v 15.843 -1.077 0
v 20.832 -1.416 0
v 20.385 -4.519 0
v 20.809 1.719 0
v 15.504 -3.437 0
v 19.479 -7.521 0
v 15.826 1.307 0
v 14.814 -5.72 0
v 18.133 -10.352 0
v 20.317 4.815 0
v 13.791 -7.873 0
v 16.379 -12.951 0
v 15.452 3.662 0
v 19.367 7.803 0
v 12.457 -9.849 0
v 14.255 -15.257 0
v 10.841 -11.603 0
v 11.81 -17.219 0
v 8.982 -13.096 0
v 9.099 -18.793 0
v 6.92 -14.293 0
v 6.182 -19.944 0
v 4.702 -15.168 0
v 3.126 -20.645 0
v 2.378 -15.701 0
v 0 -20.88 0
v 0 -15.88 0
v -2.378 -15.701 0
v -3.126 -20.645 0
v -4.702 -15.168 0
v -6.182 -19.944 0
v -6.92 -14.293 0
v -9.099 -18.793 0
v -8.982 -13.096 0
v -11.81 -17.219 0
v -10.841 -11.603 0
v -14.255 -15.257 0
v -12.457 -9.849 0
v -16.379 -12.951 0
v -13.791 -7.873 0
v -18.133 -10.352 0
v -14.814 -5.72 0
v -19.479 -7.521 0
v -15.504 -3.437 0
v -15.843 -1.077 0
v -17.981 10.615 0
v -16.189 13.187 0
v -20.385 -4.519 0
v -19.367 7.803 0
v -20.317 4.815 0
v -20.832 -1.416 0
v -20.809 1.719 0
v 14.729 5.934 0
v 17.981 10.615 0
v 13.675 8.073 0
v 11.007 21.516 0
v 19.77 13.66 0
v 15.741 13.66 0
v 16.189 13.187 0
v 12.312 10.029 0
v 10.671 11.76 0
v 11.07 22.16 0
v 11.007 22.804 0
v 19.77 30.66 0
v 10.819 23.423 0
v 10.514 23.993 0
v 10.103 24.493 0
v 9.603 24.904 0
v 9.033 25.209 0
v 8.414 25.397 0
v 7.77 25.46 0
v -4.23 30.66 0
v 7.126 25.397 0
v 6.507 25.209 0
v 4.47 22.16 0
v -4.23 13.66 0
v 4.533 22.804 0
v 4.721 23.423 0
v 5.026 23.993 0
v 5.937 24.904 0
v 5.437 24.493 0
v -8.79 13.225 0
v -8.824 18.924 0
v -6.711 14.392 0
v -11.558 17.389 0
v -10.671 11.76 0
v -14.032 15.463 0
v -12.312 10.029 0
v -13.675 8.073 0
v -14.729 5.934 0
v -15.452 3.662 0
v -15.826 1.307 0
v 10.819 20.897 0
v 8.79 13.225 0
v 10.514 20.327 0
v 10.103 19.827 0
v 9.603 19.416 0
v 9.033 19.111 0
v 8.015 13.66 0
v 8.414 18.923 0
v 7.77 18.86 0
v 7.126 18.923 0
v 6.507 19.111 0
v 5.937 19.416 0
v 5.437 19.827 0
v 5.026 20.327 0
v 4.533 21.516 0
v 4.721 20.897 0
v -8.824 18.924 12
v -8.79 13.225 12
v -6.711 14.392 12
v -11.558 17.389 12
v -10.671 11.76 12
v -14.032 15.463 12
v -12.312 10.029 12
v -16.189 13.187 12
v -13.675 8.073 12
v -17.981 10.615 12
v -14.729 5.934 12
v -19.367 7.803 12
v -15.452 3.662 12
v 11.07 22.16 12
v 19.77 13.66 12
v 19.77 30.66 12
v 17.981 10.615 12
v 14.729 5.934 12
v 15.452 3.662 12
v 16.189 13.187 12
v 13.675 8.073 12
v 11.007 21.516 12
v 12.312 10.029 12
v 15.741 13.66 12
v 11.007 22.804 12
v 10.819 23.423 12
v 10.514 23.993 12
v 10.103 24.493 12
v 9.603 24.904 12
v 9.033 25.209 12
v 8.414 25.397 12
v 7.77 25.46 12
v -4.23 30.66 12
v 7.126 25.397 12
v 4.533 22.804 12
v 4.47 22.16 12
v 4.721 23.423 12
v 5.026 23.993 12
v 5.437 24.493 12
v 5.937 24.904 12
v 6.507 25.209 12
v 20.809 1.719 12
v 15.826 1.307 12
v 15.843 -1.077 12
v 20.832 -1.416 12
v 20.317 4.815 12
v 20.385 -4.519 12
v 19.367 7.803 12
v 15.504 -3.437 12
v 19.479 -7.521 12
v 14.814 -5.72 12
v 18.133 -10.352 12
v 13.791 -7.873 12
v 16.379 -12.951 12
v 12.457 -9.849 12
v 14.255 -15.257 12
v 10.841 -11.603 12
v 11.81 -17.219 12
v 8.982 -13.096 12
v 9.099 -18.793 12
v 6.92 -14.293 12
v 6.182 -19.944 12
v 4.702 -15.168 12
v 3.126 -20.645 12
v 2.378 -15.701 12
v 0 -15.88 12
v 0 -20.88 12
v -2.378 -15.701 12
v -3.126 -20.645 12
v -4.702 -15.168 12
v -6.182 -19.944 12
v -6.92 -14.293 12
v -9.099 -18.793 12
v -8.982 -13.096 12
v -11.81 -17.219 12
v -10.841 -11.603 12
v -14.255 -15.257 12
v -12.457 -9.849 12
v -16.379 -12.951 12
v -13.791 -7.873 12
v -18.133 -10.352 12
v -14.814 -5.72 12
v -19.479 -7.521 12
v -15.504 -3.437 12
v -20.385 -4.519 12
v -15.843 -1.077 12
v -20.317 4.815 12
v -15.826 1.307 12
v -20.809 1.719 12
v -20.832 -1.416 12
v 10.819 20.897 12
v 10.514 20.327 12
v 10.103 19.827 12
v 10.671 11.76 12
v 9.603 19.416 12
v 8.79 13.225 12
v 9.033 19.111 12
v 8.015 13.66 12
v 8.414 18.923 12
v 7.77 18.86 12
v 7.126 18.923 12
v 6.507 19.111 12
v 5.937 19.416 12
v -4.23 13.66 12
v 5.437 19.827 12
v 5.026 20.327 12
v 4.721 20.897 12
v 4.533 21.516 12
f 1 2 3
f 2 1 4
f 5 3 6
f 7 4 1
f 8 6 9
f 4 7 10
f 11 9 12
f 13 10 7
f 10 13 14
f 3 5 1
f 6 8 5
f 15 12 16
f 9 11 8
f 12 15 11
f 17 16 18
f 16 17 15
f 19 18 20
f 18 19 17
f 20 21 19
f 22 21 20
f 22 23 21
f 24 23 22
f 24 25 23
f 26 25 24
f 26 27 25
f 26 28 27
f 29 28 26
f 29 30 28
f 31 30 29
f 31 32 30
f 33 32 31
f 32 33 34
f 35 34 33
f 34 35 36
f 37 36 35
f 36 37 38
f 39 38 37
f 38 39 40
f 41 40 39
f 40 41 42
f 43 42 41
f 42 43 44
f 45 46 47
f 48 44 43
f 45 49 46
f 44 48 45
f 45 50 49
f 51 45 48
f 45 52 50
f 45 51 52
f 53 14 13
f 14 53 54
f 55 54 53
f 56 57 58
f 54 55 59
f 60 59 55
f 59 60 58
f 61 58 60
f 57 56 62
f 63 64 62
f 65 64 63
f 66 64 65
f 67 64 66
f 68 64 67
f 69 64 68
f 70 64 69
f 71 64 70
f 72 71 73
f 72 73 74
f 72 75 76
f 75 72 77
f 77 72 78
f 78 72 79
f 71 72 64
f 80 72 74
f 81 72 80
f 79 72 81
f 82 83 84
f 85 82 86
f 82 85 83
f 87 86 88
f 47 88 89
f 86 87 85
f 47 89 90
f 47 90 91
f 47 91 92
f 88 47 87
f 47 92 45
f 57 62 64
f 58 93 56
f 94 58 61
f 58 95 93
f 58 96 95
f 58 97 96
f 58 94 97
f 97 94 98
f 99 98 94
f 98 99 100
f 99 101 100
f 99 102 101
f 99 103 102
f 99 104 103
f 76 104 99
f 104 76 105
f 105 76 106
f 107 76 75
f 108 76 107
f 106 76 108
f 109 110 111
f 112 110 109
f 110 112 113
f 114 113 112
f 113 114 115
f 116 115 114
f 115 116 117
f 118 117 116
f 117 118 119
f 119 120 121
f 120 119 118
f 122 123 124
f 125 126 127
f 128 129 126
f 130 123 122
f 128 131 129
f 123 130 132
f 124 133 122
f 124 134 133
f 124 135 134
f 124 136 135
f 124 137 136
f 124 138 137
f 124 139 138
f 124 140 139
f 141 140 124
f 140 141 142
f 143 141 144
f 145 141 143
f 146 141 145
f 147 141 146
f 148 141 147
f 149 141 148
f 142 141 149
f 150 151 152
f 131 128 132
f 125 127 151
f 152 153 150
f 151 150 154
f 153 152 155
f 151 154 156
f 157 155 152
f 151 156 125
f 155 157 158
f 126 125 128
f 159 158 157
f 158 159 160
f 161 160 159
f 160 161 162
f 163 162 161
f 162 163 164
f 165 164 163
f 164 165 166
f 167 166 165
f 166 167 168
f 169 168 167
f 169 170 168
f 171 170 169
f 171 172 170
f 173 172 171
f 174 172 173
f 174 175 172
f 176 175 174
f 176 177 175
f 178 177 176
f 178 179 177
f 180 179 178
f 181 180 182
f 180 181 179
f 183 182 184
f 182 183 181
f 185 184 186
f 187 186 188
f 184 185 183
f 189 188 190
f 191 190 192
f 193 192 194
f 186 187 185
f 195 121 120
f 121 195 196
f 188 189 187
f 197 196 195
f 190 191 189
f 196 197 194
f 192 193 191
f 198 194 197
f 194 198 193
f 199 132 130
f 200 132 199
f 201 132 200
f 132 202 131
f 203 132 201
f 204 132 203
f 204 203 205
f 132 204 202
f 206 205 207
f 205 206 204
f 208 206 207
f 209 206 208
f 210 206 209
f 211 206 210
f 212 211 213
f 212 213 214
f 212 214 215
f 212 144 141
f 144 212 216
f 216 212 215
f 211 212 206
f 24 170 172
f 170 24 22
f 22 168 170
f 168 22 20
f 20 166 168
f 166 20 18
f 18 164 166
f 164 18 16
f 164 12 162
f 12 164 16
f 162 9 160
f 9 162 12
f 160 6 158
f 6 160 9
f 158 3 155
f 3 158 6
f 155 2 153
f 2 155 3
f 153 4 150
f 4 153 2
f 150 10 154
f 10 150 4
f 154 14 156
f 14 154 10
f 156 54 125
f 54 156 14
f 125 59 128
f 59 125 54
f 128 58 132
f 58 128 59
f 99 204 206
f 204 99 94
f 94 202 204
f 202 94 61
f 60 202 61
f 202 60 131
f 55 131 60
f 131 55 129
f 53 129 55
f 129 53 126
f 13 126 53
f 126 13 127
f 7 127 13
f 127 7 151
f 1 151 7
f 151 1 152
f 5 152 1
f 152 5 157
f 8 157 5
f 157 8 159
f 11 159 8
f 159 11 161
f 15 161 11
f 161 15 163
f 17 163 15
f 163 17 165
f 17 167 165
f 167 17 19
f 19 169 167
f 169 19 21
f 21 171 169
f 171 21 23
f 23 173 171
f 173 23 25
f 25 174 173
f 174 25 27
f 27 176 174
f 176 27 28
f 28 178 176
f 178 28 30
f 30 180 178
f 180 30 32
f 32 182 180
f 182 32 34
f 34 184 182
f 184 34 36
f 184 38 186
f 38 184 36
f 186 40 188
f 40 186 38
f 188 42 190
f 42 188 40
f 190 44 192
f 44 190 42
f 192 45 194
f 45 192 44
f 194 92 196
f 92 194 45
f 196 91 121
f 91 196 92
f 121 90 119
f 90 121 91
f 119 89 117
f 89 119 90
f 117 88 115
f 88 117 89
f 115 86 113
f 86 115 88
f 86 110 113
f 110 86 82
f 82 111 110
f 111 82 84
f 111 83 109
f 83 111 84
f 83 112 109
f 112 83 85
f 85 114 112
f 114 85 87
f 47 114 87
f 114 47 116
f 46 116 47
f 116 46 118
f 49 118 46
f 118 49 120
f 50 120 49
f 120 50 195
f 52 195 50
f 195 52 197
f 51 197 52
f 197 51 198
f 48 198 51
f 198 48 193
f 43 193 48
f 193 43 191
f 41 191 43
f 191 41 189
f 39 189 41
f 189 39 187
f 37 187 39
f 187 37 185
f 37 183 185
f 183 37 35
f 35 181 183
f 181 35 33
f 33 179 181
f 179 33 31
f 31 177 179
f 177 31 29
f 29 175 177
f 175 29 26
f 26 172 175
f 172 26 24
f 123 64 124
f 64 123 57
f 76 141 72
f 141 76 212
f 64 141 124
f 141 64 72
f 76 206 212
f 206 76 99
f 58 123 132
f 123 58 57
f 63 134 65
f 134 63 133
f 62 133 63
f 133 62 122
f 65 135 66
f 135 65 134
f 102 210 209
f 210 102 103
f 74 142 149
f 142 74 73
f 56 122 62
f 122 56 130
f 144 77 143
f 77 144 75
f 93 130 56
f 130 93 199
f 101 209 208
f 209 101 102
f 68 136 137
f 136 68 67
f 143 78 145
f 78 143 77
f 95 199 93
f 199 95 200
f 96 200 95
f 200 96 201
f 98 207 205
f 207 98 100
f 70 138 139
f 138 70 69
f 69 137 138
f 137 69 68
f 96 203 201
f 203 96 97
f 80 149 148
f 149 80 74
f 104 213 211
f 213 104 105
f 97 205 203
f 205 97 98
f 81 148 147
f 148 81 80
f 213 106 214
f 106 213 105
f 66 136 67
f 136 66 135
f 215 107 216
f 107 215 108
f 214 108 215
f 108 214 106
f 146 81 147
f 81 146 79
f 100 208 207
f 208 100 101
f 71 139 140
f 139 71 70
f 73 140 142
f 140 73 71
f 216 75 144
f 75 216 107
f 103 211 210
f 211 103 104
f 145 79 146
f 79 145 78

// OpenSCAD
$fn = 32;

// ----------------------------------------------------------------------
// Pipe clamp: 41.76 mm ring, 5 mm wall, 12 mm wide
// ----------------------------------------------------------------------

// --- parameters (mm) ---
outer_r = 20.88;          // clamp outside radius
inner_r = 15.88;          // pipe bore radius
band = 5;                 // band thickness
clamp_w = 12;             // clamp width
opening = 50;             // opening angle between the ends
lug_w = 24;               // lug width
lug_len = 17;             // lug length
bolt_d = 6.6;             // bolt hole

clamp_profile = [[-8.824, 18.924], [-11.558, 17.389], [-14.032, 15.463], [-16.189, 13.187], [-17.981, 10.615], [-19.367, 7.803], [-20.317, 4.815], [-20.809, 1.719], [-20.832, -1.416], [-20.385, -4.519], [-19.479, -7.521], [-18.133, -10.352], [-16.379, -12.951], [-14.255, -15.257], [-11.81, -17.219], [-9.099, -18.793], [-6.182, -19.944], [-3.126, -20.645], [0, -20.88], [3.126, -20.645], [6.182, -19.944], [9.099, -18.793], [11.81, -17.219], [14.255, -15.257], [16.379, -12.951], [18.133, -10.352], [19.479, -7.521], [20.385, -4.519], [20.832, -1.416], [20.809, 1.719], [20.317, 4.815], [19.367, 7.803], [17.981, 10.615], [16.189, 13.187], [14.032, 15.463], [11.558, 17.389], [8.824, 18.924], [6.711, 14.392], [8.79, 13.225], [10.671, 11.76], [12.312, 10.029], [13.675, 8.073], [14.729, 5.934], [15.452, 3.662], [15.826, 1.307], [15.843, -1.077], [15.504, -3.437], [14.814, -5.72], [13.791, -7.873], [12.457, -9.849], [10.841, -11.603], [8.982, -13.096], [6.92, -14.293], [4.702, -15.168], [2.378, -15.701], [0, -15.88], [-2.378, -15.701], [-4.702, -15.168], [-6.92, -14.293], [-8.982, -13.096], [-10.841, -11.603], [-12.457, -9.849], [-13.791, -7.873], [-14.814, -5.72], [-15.504, -3.437], [-15.843, -1.077], [-15.826, 1.307], [-15.452, 3.662], [-14.729, 5.934], [-13.675, 8.073], [-12.312, 10.029], [-10.671, 11.76], [-8.79, 13.225], [-6.711, 14.392]];

difference() {
  union() {
    linear_extrude(height = clamp_w) polygon(clamp_profile);
    /* bolt lug on the other end */
    translate([-4.23, 13.66, 0]) cube([lug_w, 17, clamp_w]);
  }
  translate([7.77, 22.16, -2.5]) cylinder(h = clamp_w + 5, d = bolt_d);
}
